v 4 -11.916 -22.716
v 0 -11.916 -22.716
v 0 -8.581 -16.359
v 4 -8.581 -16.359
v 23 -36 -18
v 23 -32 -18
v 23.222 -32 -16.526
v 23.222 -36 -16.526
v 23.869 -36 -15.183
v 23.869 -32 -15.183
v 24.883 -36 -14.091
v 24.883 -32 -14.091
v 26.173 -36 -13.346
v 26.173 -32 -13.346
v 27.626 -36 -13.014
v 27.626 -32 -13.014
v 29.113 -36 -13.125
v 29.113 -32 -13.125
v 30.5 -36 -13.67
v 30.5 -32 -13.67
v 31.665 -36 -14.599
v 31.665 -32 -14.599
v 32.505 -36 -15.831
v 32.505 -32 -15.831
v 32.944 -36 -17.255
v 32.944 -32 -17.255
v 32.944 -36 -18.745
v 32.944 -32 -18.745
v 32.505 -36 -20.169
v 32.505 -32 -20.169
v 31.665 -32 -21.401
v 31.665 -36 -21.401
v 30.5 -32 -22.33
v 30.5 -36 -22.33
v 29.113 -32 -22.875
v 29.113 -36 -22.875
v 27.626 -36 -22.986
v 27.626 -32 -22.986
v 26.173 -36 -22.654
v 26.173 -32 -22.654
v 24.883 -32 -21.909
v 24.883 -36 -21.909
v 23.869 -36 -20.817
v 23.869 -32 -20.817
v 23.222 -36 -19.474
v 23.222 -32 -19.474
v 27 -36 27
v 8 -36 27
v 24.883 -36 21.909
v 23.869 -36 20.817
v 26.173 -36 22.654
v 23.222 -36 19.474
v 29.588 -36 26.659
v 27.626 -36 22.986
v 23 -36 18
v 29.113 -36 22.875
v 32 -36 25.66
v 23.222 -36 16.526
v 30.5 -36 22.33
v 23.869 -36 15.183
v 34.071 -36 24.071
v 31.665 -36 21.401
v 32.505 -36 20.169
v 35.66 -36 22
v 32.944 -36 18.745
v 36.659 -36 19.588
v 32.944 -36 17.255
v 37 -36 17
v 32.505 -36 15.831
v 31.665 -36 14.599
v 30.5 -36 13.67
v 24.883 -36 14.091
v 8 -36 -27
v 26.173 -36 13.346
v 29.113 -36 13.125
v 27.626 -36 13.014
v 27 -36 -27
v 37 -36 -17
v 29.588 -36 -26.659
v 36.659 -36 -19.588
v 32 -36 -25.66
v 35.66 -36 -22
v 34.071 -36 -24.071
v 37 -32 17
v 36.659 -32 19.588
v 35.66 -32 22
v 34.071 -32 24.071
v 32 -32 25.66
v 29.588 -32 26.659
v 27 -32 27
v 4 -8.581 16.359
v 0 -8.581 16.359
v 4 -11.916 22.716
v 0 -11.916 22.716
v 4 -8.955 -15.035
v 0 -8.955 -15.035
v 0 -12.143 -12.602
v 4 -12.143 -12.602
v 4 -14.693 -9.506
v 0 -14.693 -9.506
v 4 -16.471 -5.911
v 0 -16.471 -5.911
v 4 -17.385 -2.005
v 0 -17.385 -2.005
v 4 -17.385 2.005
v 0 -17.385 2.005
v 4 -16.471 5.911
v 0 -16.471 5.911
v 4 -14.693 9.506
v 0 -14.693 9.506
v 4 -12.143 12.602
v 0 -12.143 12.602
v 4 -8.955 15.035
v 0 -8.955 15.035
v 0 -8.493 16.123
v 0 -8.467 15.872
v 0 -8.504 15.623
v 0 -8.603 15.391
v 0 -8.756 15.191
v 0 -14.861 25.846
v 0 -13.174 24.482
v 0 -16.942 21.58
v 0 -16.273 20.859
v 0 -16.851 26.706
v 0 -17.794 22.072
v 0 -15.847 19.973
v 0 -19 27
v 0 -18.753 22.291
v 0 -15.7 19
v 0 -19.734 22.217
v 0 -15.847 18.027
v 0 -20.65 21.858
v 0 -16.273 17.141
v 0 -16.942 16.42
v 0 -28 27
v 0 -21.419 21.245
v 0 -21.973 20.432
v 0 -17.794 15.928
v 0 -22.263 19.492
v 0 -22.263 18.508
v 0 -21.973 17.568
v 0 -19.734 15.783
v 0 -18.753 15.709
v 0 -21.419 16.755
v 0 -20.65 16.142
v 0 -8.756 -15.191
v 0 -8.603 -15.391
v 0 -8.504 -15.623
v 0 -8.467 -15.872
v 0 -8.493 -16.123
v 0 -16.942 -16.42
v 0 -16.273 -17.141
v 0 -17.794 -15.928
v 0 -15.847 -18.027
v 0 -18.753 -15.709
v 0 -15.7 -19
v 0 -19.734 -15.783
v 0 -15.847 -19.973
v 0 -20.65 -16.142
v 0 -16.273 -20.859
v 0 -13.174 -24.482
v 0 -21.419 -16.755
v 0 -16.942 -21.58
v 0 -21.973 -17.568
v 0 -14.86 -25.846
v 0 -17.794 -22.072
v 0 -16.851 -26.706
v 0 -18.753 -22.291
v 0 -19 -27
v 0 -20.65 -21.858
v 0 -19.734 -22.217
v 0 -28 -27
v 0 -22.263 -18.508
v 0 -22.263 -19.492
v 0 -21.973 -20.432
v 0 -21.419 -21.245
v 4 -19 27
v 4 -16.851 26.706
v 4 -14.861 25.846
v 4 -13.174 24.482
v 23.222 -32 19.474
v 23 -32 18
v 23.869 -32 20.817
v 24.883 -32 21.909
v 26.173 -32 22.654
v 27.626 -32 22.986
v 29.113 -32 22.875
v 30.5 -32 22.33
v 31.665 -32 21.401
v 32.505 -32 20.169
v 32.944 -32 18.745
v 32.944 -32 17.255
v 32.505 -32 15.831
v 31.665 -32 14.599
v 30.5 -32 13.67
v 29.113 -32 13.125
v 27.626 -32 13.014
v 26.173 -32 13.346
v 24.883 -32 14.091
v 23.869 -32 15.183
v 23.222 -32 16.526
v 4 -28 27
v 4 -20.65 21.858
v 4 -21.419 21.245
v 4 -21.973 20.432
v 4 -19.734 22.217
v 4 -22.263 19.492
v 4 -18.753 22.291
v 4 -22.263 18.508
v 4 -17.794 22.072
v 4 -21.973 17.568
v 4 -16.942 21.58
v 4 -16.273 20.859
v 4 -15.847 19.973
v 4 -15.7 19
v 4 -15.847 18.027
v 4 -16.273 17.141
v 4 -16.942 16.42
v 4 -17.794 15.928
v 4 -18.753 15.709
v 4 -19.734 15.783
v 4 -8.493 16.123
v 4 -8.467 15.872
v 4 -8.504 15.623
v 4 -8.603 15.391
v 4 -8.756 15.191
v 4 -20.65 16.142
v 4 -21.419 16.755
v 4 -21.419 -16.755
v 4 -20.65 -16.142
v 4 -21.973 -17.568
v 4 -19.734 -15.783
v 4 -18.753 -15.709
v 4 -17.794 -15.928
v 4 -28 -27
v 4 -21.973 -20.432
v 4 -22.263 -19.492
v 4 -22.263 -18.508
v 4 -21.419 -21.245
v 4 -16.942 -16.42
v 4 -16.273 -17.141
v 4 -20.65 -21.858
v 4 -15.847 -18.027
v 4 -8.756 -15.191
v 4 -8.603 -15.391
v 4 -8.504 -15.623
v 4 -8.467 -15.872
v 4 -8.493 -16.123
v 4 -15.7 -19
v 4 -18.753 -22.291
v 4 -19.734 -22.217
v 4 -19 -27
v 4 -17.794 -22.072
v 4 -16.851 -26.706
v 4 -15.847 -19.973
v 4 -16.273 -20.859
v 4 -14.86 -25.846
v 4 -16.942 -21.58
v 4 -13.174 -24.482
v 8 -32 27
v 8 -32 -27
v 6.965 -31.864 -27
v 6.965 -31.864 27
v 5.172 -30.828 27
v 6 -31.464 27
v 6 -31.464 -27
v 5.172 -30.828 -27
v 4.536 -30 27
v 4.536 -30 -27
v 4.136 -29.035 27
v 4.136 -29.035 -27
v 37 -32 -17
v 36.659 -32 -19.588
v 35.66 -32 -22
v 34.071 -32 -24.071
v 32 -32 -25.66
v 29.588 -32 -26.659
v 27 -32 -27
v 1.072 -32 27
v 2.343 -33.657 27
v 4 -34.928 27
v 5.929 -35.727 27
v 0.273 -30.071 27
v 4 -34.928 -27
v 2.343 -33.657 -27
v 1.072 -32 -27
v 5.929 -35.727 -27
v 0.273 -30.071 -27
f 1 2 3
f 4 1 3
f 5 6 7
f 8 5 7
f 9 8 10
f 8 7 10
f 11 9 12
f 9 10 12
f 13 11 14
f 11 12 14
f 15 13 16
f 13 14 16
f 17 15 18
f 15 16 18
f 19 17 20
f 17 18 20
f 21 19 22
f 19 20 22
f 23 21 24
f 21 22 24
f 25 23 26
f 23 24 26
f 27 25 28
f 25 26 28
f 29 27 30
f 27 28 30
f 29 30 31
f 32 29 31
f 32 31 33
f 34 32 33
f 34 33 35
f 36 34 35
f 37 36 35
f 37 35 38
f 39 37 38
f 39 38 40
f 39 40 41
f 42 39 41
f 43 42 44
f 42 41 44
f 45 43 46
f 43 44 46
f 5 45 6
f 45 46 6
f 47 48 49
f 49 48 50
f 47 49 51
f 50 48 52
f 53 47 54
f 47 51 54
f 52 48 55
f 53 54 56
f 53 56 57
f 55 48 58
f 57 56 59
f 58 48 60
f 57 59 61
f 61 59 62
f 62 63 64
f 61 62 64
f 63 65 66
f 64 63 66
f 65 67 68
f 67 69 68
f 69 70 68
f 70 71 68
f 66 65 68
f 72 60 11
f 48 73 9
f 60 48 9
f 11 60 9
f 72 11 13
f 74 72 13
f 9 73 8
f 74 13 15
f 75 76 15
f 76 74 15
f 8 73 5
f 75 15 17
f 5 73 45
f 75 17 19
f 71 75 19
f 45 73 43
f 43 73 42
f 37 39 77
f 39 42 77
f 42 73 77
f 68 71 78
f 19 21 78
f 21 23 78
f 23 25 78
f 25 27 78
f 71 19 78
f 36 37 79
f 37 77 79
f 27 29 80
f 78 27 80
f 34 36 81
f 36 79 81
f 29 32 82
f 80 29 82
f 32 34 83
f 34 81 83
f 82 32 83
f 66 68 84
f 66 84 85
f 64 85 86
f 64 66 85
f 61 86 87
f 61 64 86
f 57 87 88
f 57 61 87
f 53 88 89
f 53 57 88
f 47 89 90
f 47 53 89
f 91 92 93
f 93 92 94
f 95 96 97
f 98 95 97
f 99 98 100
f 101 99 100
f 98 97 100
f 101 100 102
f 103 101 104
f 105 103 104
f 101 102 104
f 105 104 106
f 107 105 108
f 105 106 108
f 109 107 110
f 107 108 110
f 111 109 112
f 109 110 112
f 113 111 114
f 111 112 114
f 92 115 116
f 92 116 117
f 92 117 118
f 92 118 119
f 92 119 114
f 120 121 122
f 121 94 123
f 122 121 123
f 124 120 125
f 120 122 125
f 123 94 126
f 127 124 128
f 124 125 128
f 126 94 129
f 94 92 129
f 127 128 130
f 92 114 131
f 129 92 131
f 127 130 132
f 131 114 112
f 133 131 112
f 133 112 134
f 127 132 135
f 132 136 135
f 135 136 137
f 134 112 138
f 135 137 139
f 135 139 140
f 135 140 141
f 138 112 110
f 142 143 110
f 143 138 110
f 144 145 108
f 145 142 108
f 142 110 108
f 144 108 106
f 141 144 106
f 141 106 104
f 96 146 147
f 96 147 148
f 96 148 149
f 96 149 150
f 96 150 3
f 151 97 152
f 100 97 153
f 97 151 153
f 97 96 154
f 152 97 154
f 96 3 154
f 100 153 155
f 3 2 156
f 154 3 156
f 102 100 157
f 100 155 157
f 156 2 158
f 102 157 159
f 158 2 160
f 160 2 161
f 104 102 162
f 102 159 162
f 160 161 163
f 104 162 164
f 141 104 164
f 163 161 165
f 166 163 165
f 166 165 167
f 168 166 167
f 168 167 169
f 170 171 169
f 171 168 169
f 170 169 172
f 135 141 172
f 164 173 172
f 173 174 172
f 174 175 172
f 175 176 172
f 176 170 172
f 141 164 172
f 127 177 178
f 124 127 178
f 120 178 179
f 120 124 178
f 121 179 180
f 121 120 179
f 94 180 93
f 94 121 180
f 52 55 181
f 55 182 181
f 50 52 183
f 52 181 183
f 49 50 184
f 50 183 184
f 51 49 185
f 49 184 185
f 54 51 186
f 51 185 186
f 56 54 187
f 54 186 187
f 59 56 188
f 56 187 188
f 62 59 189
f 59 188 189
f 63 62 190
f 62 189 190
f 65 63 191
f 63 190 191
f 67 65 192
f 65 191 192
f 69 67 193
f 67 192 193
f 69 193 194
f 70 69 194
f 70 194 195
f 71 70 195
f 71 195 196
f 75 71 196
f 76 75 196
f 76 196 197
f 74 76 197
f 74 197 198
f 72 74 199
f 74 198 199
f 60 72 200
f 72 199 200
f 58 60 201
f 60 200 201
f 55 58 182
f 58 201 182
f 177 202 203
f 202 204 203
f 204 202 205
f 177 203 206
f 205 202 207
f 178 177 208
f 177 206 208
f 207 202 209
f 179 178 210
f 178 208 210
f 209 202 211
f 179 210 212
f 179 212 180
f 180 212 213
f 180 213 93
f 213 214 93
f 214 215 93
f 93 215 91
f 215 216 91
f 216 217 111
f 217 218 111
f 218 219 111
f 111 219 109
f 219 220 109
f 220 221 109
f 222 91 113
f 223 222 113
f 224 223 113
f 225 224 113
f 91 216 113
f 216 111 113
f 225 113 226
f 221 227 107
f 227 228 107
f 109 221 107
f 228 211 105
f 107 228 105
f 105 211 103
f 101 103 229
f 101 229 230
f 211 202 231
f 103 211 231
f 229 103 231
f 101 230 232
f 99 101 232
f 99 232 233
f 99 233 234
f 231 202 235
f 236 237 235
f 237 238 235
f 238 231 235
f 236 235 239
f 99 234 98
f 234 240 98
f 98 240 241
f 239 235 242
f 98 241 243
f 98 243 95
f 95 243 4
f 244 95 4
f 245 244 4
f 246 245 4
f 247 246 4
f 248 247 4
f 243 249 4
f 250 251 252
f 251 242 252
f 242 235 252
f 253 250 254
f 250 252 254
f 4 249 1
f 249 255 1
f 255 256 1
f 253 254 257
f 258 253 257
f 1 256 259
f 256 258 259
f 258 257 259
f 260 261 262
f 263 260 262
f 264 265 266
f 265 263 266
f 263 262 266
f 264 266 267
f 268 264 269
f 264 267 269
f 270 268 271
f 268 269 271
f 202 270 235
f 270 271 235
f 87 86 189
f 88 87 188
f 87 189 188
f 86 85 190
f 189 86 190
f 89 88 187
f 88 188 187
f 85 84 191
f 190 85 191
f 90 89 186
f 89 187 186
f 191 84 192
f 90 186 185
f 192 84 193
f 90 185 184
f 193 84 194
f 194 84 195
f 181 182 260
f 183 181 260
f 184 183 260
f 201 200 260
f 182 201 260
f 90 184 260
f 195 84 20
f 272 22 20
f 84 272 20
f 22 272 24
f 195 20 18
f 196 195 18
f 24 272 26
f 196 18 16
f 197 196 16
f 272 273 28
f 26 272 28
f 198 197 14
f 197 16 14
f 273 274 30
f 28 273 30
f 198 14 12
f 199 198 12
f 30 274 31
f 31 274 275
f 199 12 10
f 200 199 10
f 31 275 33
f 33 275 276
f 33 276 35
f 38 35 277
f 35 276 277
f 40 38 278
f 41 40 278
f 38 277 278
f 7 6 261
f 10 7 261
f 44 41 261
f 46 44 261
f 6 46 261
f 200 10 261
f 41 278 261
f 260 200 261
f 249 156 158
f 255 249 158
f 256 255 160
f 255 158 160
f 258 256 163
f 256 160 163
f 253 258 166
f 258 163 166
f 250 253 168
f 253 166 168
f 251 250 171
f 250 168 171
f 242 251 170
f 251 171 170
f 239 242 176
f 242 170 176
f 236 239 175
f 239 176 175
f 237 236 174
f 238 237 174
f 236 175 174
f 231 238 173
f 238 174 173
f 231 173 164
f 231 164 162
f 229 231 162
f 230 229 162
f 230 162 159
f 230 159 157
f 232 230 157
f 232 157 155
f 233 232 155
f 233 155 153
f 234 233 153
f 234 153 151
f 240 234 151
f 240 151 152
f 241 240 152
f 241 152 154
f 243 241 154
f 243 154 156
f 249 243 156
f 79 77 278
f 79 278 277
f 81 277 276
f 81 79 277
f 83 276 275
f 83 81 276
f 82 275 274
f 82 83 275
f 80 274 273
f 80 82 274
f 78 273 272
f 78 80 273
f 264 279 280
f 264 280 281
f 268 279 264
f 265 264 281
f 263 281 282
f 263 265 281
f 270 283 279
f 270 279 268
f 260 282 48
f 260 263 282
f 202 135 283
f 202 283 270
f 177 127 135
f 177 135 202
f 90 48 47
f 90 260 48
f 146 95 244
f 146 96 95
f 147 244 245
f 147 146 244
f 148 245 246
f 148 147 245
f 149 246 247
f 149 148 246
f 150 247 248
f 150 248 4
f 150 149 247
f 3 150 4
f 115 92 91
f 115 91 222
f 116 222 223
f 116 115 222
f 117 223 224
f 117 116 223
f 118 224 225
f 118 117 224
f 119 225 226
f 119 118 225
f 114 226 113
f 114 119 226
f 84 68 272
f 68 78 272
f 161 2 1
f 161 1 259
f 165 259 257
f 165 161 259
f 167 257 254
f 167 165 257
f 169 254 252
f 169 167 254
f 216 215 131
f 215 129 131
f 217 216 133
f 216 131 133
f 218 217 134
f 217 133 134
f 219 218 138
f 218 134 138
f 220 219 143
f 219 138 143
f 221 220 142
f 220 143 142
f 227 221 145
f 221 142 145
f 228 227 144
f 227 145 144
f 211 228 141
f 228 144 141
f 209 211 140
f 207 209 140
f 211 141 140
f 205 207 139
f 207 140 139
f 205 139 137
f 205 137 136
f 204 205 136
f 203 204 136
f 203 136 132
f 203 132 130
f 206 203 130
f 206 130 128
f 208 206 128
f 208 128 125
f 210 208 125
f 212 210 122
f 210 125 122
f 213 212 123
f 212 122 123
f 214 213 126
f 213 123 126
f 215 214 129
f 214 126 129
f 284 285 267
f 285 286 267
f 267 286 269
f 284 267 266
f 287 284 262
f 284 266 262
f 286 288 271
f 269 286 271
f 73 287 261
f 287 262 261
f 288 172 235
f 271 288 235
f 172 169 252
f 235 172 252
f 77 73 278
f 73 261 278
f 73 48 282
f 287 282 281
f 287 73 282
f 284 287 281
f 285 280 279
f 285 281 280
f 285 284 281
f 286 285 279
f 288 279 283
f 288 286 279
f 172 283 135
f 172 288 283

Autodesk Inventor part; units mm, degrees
sketch "Sketch_1" plane through (0, 0, 0) normal (0, 0, 1) x (1, 0, 0)
  line L0 (0, -1) -> (0, -28)
  arc A0 (0, -28) -> (8, -36) centre (8, -28) ccw
  line L1 (8, -36) -> (37, -36)
  line L2 (37, -36) -> (37, -32)
  line L3 (37, -32) -> (8, -32)
  arc A1 (4, -28) -> (8, -32) centre (8, -28) ccw
  line L4 (4, -28) -> (4, -1)
  line L5 (4, -1) -> (0, -1)
extrude "Extrusion1" add sketch "Sketch_1" along normal mid plane 54
sketch "Sketch_2" plane through (0, 0, 0) normal (0, 1, 0) x (-1, 0, 0)
  line L0 (-27, -37) -> (-27, -27)
  arc A0 (-37, -17) -> (-27, -27) centre (-27, -17) ccw
  line L1 (-37, -17) -> (-37, 17)
  arc A1 (-27, 27) -> (-37, 17) centre (-27, 17) ccw
  line L2 (-27, 27) -> (-27, 37)
  line L3 (-27, 37) -> (-47, 37)
  line L4 (-47, 37) -> (-47, -37)
  line L5 (-47, -37) -> (-27, -37)
extrude "Extrusion2" cut sketch "Sketch_2" along normal mid plane 74
sketch "Sketch_3" plane through (0, 0, 0) normal (0, 1, 0) x (-1, 0, 0)
  circle A0 centre (-28, -18) radius 5
extrude "Extrusion3" cut sketch "Sketch_3" along normal mid plane 74
sketch "Sketch_4" plane through (0, 0, 0) normal (0, 1, 0) x (-1, 0, 0)
  circle A0 centre (-28, 18) radius 5
extrude "Extrusion4" cut sketch "Sketch_4" along normal mid plane 74
sketch "Sketch_5" plane through (0, 0, 0) normal (1, 0, 0) x (0, 1, 0)
  circle A0 centre (-19, 19) radius 3.3
extrude "Extrusion5" cut sketch "Sketch_5" along normal mid plane 10
sketch "Sketch_6" plane through (0, 0, 0) normal (1, 0, 0) x (0, 1, 0)
  circle A0 centre (-19, -19) radius 3.3
extrude "Extrusion6" cut sketch "Sketch_6" along normal mid plane 10
sketch "Sketch_7" plane through (0, 0, 0) normal (1, 0, 0) x (0, 1, 0)
  line L0 (-41, 32) -> (-41, -32)
  line L1 (-41, -32) -> (0, -32)
  line L2 (0, -32) -> (0, 32)
  line L3 (0, 32) -> (-41, 32)
  line L4 (-19, 27) -> (-36, 27)
  line L5 (-36, 27) -> (-36, -27)
  line L6 (-36, -27) -> (-19, -27)
  arc A0 (-19, -27) -> (-11.9155, -22.7161) centre (-19, -19) ccw
  line L7 (-11.9155, -22.7161) -> (-8.5809, -16.359)
  arc A1 (-8.5809, -16.359) -> (-8.9548, -15.0353) centre (-9.4665, -15.8945) ccw
  arc A2 (-8.9548, 15.0353) -> (-8.9548, -15.0353) centre (0, 0) ccw
  arc A3 (-8.9548, 15.0353) -> (-8.5809, 16.359) centre (-9.4665, 15.8945) ccw
  line L8 (-8.5809, 16.359) -> (-11.9155, 22.7161)
  arc A4 (-11.9155, 22.7161) -> (-19, 27) centre (-19, 19) ccw
extrude "Extrusion7" cut sketch "Sketch_7" along normal mid plane 10
ref_plane "HNC_1_XY" through (0, 0, 0) normal (1, 0, 0) x (0, 0, -1)
ref_plane "HNC_1_YZ" through (0, 0, 0) normal (0, 0, -1) x (0, 1, 0)
ref_plane "HNC_1_ZX" through (0, 0, 0) normal (0, 1, 0) x (1, 0, 0)
ref_plane "HNC_2_XY" through (4, -19, 19) normal (1, 0, 0) x (0, 0, -1)
ref_plane "HNC_2_YZ" through (4, -19, 19) normal (0, 0, -1) x (0, 1, 0)
ref_plane "HNC_2_ZX" through (4, -19, 19) normal (0, 1, 0) x (1, 0, 0)
ref_plane "HNC_3_XY" through (4, -19, -19) normal (1, 0, 0) x (0, 0, -1)
ref_plane "HNC_3_YZ" through (4, -19, -19) normal (0, 0, -1) x (0, 1, 0)
ref_plane "HNC_3_ZX" through (4, -19, -19) normal (0, 1, 0) x (1, 0, 0)
ref_plane "P19_XY" through (28, -32, -18) normal (0, 1, 0) x (1, 0, 0)
ref_plane "P19_YZ" through (28, -32, -18) normal (1, 0, 0) x (0, 0, -1)
ref_plane "P19_ZX" through (28, -32, -18) normal (0, 0, -1) x (0, 1, 0)
ref_plane "P20_XY" through (28, -32, 18) normal (0, 1, 0) x (1, 0, 0)
ref_plane "P20_YZ" through (28, -32, 18) normal (1, 0, 0) x (0, 0, -1)
ref_plane "P20_ZX" through (28, -32, 18) normal (0, 0, -1) x (0, 1, 0)
properties part number "174370 HNC-40---(F)"
